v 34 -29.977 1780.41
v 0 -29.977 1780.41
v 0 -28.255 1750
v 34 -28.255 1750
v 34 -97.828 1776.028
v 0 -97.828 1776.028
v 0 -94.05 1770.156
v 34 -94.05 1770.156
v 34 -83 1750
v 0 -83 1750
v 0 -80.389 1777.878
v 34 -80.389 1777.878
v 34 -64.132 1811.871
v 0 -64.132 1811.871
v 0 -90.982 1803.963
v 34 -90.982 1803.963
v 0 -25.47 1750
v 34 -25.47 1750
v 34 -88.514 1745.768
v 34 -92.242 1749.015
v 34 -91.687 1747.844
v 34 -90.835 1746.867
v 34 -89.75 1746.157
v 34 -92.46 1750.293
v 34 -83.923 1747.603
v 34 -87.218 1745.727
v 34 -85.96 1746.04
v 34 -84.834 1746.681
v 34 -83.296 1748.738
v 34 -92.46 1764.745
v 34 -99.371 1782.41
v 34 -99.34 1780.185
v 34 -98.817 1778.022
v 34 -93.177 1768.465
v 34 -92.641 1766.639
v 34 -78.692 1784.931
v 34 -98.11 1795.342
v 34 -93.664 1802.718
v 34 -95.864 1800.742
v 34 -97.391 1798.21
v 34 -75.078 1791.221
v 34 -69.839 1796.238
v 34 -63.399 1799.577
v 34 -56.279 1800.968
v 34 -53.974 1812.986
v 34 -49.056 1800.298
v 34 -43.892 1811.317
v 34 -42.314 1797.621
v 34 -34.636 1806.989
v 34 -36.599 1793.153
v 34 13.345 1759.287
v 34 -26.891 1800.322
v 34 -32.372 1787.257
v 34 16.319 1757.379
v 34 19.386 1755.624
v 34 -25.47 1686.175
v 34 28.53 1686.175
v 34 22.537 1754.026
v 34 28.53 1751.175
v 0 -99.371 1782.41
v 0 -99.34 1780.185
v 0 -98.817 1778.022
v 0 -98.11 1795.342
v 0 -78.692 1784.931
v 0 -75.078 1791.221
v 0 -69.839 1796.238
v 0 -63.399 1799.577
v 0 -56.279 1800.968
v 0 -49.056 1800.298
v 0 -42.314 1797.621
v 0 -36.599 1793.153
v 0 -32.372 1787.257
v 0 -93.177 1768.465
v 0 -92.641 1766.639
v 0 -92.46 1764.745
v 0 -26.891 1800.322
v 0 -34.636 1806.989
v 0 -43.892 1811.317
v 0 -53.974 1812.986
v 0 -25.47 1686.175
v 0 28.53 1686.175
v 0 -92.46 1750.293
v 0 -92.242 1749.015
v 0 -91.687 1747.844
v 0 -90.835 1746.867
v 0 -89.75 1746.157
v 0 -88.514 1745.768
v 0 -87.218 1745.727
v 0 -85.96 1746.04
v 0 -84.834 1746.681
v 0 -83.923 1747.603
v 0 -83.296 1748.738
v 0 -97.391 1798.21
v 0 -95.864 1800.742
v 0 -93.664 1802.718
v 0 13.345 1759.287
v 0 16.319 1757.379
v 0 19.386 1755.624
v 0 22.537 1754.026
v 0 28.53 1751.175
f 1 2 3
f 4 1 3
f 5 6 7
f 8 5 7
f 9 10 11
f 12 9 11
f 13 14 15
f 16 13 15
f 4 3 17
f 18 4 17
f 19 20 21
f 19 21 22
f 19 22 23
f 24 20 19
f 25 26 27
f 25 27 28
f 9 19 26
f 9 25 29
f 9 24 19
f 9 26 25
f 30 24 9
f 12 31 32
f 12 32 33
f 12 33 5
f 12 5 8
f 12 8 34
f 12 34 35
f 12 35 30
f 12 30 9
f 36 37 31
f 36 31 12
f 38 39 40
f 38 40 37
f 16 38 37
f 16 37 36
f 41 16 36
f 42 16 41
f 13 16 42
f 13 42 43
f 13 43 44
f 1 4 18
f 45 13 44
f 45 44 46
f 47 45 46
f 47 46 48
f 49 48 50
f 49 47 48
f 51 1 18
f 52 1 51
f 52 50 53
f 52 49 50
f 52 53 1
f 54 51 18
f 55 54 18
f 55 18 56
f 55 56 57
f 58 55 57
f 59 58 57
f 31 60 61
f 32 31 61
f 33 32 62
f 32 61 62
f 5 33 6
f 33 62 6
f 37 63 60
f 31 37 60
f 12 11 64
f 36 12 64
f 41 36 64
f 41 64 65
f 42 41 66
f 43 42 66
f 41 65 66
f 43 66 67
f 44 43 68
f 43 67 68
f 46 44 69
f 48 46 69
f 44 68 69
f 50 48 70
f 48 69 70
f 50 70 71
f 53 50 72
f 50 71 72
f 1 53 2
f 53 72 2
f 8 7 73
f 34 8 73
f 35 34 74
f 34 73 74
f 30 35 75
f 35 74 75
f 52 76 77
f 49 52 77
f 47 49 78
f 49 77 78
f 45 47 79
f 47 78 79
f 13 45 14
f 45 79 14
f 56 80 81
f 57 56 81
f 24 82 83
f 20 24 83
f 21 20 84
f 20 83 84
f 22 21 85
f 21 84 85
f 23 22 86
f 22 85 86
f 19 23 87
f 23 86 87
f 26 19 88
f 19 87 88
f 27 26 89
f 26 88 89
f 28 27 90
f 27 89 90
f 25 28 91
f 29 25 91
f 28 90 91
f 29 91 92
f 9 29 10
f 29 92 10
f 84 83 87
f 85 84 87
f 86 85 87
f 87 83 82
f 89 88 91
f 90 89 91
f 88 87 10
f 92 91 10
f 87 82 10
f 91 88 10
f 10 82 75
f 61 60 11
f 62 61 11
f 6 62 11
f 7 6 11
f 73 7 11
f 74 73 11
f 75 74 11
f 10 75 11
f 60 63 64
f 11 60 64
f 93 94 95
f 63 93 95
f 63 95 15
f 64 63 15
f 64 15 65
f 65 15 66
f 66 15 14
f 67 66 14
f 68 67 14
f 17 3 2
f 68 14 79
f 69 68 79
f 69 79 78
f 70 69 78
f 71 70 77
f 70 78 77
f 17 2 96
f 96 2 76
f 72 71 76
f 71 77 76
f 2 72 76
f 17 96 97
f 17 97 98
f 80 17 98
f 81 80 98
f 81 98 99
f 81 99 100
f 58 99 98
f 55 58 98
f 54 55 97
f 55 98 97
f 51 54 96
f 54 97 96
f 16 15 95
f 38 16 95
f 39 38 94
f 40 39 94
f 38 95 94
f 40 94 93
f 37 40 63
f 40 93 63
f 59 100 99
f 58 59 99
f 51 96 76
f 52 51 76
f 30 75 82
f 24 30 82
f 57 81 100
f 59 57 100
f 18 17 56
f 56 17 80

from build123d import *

# Parameters (mm, degrees)
F1_DEPTH = 34


with BuildPart() as f1:
    # F0 (on Right) → F1 (new body)
    with BuildSketch(Plane.YZ):
        with BuildLine():
            ThreePointArc((-26.890983, 1800.32203), (-43.892365, 1811.317181), (-64.131767, 1811.871154))
            Line((-64.131767, 1811.871154), (-90.982187, 1803.963156))
            ThreePointArc((-90.982187, 1803.963156), (-95.864249, 1800.742189), (-98.109715, 1795.341538))
            Line((-98.109715, 1795.341538), (-99.371331, 1782.409853))
            ThreePointArc((-99.371331, 1782.409853), (-99.138499, 1779.088701), (-97.828286, 1776.028048))
            Line((-97.828286, 1776.028048), (-94.050036, 1770.155742))
            ThreePointArc((-94.050036, 1770.155742), (-92.865546, 1767.564766), (-92.459738, 1764.744928))
            Line((-92.459738, 1764.744928), (-92.459738, 1750.292804))
            ThreePointArc((-92.459738, 1750.292804), (-87.867403, 1745.703047), (-83, 1750))
            Line((-83, 1750), (-80.388879, 1777.877985))
            ThreePointArc((-80.388879, 1777.877985), (-56.279235, 1800.967893), (-29.977198, 1780.41013))
            Line((-29.977198, 1780.41013), (-28.255004, 1750))
            Line((-28.255004, 1750), (-25.470103, 1750))
            Line((-25.470103, 1750), (-25.470103, 1686.175056))
            Line((-25.470103, 1686.175056), (28.529897, 1686.175056))
            Line((28.529897, 1686.175056), (28.529897, 1751.175056))
            Line((28.529897, 1751.175056), (22.537481, 1754.025714))
            ThreePointArc((22.537481, 1754.025714), (17.84148, 1756.482182), (13.345133, 1759.28745))
            Line((13.345133, 1759.28745), (-26.890983, 1800.32203))
        make_face()
    extrude(amount=F1_DEPTH)


solid = f1.part
